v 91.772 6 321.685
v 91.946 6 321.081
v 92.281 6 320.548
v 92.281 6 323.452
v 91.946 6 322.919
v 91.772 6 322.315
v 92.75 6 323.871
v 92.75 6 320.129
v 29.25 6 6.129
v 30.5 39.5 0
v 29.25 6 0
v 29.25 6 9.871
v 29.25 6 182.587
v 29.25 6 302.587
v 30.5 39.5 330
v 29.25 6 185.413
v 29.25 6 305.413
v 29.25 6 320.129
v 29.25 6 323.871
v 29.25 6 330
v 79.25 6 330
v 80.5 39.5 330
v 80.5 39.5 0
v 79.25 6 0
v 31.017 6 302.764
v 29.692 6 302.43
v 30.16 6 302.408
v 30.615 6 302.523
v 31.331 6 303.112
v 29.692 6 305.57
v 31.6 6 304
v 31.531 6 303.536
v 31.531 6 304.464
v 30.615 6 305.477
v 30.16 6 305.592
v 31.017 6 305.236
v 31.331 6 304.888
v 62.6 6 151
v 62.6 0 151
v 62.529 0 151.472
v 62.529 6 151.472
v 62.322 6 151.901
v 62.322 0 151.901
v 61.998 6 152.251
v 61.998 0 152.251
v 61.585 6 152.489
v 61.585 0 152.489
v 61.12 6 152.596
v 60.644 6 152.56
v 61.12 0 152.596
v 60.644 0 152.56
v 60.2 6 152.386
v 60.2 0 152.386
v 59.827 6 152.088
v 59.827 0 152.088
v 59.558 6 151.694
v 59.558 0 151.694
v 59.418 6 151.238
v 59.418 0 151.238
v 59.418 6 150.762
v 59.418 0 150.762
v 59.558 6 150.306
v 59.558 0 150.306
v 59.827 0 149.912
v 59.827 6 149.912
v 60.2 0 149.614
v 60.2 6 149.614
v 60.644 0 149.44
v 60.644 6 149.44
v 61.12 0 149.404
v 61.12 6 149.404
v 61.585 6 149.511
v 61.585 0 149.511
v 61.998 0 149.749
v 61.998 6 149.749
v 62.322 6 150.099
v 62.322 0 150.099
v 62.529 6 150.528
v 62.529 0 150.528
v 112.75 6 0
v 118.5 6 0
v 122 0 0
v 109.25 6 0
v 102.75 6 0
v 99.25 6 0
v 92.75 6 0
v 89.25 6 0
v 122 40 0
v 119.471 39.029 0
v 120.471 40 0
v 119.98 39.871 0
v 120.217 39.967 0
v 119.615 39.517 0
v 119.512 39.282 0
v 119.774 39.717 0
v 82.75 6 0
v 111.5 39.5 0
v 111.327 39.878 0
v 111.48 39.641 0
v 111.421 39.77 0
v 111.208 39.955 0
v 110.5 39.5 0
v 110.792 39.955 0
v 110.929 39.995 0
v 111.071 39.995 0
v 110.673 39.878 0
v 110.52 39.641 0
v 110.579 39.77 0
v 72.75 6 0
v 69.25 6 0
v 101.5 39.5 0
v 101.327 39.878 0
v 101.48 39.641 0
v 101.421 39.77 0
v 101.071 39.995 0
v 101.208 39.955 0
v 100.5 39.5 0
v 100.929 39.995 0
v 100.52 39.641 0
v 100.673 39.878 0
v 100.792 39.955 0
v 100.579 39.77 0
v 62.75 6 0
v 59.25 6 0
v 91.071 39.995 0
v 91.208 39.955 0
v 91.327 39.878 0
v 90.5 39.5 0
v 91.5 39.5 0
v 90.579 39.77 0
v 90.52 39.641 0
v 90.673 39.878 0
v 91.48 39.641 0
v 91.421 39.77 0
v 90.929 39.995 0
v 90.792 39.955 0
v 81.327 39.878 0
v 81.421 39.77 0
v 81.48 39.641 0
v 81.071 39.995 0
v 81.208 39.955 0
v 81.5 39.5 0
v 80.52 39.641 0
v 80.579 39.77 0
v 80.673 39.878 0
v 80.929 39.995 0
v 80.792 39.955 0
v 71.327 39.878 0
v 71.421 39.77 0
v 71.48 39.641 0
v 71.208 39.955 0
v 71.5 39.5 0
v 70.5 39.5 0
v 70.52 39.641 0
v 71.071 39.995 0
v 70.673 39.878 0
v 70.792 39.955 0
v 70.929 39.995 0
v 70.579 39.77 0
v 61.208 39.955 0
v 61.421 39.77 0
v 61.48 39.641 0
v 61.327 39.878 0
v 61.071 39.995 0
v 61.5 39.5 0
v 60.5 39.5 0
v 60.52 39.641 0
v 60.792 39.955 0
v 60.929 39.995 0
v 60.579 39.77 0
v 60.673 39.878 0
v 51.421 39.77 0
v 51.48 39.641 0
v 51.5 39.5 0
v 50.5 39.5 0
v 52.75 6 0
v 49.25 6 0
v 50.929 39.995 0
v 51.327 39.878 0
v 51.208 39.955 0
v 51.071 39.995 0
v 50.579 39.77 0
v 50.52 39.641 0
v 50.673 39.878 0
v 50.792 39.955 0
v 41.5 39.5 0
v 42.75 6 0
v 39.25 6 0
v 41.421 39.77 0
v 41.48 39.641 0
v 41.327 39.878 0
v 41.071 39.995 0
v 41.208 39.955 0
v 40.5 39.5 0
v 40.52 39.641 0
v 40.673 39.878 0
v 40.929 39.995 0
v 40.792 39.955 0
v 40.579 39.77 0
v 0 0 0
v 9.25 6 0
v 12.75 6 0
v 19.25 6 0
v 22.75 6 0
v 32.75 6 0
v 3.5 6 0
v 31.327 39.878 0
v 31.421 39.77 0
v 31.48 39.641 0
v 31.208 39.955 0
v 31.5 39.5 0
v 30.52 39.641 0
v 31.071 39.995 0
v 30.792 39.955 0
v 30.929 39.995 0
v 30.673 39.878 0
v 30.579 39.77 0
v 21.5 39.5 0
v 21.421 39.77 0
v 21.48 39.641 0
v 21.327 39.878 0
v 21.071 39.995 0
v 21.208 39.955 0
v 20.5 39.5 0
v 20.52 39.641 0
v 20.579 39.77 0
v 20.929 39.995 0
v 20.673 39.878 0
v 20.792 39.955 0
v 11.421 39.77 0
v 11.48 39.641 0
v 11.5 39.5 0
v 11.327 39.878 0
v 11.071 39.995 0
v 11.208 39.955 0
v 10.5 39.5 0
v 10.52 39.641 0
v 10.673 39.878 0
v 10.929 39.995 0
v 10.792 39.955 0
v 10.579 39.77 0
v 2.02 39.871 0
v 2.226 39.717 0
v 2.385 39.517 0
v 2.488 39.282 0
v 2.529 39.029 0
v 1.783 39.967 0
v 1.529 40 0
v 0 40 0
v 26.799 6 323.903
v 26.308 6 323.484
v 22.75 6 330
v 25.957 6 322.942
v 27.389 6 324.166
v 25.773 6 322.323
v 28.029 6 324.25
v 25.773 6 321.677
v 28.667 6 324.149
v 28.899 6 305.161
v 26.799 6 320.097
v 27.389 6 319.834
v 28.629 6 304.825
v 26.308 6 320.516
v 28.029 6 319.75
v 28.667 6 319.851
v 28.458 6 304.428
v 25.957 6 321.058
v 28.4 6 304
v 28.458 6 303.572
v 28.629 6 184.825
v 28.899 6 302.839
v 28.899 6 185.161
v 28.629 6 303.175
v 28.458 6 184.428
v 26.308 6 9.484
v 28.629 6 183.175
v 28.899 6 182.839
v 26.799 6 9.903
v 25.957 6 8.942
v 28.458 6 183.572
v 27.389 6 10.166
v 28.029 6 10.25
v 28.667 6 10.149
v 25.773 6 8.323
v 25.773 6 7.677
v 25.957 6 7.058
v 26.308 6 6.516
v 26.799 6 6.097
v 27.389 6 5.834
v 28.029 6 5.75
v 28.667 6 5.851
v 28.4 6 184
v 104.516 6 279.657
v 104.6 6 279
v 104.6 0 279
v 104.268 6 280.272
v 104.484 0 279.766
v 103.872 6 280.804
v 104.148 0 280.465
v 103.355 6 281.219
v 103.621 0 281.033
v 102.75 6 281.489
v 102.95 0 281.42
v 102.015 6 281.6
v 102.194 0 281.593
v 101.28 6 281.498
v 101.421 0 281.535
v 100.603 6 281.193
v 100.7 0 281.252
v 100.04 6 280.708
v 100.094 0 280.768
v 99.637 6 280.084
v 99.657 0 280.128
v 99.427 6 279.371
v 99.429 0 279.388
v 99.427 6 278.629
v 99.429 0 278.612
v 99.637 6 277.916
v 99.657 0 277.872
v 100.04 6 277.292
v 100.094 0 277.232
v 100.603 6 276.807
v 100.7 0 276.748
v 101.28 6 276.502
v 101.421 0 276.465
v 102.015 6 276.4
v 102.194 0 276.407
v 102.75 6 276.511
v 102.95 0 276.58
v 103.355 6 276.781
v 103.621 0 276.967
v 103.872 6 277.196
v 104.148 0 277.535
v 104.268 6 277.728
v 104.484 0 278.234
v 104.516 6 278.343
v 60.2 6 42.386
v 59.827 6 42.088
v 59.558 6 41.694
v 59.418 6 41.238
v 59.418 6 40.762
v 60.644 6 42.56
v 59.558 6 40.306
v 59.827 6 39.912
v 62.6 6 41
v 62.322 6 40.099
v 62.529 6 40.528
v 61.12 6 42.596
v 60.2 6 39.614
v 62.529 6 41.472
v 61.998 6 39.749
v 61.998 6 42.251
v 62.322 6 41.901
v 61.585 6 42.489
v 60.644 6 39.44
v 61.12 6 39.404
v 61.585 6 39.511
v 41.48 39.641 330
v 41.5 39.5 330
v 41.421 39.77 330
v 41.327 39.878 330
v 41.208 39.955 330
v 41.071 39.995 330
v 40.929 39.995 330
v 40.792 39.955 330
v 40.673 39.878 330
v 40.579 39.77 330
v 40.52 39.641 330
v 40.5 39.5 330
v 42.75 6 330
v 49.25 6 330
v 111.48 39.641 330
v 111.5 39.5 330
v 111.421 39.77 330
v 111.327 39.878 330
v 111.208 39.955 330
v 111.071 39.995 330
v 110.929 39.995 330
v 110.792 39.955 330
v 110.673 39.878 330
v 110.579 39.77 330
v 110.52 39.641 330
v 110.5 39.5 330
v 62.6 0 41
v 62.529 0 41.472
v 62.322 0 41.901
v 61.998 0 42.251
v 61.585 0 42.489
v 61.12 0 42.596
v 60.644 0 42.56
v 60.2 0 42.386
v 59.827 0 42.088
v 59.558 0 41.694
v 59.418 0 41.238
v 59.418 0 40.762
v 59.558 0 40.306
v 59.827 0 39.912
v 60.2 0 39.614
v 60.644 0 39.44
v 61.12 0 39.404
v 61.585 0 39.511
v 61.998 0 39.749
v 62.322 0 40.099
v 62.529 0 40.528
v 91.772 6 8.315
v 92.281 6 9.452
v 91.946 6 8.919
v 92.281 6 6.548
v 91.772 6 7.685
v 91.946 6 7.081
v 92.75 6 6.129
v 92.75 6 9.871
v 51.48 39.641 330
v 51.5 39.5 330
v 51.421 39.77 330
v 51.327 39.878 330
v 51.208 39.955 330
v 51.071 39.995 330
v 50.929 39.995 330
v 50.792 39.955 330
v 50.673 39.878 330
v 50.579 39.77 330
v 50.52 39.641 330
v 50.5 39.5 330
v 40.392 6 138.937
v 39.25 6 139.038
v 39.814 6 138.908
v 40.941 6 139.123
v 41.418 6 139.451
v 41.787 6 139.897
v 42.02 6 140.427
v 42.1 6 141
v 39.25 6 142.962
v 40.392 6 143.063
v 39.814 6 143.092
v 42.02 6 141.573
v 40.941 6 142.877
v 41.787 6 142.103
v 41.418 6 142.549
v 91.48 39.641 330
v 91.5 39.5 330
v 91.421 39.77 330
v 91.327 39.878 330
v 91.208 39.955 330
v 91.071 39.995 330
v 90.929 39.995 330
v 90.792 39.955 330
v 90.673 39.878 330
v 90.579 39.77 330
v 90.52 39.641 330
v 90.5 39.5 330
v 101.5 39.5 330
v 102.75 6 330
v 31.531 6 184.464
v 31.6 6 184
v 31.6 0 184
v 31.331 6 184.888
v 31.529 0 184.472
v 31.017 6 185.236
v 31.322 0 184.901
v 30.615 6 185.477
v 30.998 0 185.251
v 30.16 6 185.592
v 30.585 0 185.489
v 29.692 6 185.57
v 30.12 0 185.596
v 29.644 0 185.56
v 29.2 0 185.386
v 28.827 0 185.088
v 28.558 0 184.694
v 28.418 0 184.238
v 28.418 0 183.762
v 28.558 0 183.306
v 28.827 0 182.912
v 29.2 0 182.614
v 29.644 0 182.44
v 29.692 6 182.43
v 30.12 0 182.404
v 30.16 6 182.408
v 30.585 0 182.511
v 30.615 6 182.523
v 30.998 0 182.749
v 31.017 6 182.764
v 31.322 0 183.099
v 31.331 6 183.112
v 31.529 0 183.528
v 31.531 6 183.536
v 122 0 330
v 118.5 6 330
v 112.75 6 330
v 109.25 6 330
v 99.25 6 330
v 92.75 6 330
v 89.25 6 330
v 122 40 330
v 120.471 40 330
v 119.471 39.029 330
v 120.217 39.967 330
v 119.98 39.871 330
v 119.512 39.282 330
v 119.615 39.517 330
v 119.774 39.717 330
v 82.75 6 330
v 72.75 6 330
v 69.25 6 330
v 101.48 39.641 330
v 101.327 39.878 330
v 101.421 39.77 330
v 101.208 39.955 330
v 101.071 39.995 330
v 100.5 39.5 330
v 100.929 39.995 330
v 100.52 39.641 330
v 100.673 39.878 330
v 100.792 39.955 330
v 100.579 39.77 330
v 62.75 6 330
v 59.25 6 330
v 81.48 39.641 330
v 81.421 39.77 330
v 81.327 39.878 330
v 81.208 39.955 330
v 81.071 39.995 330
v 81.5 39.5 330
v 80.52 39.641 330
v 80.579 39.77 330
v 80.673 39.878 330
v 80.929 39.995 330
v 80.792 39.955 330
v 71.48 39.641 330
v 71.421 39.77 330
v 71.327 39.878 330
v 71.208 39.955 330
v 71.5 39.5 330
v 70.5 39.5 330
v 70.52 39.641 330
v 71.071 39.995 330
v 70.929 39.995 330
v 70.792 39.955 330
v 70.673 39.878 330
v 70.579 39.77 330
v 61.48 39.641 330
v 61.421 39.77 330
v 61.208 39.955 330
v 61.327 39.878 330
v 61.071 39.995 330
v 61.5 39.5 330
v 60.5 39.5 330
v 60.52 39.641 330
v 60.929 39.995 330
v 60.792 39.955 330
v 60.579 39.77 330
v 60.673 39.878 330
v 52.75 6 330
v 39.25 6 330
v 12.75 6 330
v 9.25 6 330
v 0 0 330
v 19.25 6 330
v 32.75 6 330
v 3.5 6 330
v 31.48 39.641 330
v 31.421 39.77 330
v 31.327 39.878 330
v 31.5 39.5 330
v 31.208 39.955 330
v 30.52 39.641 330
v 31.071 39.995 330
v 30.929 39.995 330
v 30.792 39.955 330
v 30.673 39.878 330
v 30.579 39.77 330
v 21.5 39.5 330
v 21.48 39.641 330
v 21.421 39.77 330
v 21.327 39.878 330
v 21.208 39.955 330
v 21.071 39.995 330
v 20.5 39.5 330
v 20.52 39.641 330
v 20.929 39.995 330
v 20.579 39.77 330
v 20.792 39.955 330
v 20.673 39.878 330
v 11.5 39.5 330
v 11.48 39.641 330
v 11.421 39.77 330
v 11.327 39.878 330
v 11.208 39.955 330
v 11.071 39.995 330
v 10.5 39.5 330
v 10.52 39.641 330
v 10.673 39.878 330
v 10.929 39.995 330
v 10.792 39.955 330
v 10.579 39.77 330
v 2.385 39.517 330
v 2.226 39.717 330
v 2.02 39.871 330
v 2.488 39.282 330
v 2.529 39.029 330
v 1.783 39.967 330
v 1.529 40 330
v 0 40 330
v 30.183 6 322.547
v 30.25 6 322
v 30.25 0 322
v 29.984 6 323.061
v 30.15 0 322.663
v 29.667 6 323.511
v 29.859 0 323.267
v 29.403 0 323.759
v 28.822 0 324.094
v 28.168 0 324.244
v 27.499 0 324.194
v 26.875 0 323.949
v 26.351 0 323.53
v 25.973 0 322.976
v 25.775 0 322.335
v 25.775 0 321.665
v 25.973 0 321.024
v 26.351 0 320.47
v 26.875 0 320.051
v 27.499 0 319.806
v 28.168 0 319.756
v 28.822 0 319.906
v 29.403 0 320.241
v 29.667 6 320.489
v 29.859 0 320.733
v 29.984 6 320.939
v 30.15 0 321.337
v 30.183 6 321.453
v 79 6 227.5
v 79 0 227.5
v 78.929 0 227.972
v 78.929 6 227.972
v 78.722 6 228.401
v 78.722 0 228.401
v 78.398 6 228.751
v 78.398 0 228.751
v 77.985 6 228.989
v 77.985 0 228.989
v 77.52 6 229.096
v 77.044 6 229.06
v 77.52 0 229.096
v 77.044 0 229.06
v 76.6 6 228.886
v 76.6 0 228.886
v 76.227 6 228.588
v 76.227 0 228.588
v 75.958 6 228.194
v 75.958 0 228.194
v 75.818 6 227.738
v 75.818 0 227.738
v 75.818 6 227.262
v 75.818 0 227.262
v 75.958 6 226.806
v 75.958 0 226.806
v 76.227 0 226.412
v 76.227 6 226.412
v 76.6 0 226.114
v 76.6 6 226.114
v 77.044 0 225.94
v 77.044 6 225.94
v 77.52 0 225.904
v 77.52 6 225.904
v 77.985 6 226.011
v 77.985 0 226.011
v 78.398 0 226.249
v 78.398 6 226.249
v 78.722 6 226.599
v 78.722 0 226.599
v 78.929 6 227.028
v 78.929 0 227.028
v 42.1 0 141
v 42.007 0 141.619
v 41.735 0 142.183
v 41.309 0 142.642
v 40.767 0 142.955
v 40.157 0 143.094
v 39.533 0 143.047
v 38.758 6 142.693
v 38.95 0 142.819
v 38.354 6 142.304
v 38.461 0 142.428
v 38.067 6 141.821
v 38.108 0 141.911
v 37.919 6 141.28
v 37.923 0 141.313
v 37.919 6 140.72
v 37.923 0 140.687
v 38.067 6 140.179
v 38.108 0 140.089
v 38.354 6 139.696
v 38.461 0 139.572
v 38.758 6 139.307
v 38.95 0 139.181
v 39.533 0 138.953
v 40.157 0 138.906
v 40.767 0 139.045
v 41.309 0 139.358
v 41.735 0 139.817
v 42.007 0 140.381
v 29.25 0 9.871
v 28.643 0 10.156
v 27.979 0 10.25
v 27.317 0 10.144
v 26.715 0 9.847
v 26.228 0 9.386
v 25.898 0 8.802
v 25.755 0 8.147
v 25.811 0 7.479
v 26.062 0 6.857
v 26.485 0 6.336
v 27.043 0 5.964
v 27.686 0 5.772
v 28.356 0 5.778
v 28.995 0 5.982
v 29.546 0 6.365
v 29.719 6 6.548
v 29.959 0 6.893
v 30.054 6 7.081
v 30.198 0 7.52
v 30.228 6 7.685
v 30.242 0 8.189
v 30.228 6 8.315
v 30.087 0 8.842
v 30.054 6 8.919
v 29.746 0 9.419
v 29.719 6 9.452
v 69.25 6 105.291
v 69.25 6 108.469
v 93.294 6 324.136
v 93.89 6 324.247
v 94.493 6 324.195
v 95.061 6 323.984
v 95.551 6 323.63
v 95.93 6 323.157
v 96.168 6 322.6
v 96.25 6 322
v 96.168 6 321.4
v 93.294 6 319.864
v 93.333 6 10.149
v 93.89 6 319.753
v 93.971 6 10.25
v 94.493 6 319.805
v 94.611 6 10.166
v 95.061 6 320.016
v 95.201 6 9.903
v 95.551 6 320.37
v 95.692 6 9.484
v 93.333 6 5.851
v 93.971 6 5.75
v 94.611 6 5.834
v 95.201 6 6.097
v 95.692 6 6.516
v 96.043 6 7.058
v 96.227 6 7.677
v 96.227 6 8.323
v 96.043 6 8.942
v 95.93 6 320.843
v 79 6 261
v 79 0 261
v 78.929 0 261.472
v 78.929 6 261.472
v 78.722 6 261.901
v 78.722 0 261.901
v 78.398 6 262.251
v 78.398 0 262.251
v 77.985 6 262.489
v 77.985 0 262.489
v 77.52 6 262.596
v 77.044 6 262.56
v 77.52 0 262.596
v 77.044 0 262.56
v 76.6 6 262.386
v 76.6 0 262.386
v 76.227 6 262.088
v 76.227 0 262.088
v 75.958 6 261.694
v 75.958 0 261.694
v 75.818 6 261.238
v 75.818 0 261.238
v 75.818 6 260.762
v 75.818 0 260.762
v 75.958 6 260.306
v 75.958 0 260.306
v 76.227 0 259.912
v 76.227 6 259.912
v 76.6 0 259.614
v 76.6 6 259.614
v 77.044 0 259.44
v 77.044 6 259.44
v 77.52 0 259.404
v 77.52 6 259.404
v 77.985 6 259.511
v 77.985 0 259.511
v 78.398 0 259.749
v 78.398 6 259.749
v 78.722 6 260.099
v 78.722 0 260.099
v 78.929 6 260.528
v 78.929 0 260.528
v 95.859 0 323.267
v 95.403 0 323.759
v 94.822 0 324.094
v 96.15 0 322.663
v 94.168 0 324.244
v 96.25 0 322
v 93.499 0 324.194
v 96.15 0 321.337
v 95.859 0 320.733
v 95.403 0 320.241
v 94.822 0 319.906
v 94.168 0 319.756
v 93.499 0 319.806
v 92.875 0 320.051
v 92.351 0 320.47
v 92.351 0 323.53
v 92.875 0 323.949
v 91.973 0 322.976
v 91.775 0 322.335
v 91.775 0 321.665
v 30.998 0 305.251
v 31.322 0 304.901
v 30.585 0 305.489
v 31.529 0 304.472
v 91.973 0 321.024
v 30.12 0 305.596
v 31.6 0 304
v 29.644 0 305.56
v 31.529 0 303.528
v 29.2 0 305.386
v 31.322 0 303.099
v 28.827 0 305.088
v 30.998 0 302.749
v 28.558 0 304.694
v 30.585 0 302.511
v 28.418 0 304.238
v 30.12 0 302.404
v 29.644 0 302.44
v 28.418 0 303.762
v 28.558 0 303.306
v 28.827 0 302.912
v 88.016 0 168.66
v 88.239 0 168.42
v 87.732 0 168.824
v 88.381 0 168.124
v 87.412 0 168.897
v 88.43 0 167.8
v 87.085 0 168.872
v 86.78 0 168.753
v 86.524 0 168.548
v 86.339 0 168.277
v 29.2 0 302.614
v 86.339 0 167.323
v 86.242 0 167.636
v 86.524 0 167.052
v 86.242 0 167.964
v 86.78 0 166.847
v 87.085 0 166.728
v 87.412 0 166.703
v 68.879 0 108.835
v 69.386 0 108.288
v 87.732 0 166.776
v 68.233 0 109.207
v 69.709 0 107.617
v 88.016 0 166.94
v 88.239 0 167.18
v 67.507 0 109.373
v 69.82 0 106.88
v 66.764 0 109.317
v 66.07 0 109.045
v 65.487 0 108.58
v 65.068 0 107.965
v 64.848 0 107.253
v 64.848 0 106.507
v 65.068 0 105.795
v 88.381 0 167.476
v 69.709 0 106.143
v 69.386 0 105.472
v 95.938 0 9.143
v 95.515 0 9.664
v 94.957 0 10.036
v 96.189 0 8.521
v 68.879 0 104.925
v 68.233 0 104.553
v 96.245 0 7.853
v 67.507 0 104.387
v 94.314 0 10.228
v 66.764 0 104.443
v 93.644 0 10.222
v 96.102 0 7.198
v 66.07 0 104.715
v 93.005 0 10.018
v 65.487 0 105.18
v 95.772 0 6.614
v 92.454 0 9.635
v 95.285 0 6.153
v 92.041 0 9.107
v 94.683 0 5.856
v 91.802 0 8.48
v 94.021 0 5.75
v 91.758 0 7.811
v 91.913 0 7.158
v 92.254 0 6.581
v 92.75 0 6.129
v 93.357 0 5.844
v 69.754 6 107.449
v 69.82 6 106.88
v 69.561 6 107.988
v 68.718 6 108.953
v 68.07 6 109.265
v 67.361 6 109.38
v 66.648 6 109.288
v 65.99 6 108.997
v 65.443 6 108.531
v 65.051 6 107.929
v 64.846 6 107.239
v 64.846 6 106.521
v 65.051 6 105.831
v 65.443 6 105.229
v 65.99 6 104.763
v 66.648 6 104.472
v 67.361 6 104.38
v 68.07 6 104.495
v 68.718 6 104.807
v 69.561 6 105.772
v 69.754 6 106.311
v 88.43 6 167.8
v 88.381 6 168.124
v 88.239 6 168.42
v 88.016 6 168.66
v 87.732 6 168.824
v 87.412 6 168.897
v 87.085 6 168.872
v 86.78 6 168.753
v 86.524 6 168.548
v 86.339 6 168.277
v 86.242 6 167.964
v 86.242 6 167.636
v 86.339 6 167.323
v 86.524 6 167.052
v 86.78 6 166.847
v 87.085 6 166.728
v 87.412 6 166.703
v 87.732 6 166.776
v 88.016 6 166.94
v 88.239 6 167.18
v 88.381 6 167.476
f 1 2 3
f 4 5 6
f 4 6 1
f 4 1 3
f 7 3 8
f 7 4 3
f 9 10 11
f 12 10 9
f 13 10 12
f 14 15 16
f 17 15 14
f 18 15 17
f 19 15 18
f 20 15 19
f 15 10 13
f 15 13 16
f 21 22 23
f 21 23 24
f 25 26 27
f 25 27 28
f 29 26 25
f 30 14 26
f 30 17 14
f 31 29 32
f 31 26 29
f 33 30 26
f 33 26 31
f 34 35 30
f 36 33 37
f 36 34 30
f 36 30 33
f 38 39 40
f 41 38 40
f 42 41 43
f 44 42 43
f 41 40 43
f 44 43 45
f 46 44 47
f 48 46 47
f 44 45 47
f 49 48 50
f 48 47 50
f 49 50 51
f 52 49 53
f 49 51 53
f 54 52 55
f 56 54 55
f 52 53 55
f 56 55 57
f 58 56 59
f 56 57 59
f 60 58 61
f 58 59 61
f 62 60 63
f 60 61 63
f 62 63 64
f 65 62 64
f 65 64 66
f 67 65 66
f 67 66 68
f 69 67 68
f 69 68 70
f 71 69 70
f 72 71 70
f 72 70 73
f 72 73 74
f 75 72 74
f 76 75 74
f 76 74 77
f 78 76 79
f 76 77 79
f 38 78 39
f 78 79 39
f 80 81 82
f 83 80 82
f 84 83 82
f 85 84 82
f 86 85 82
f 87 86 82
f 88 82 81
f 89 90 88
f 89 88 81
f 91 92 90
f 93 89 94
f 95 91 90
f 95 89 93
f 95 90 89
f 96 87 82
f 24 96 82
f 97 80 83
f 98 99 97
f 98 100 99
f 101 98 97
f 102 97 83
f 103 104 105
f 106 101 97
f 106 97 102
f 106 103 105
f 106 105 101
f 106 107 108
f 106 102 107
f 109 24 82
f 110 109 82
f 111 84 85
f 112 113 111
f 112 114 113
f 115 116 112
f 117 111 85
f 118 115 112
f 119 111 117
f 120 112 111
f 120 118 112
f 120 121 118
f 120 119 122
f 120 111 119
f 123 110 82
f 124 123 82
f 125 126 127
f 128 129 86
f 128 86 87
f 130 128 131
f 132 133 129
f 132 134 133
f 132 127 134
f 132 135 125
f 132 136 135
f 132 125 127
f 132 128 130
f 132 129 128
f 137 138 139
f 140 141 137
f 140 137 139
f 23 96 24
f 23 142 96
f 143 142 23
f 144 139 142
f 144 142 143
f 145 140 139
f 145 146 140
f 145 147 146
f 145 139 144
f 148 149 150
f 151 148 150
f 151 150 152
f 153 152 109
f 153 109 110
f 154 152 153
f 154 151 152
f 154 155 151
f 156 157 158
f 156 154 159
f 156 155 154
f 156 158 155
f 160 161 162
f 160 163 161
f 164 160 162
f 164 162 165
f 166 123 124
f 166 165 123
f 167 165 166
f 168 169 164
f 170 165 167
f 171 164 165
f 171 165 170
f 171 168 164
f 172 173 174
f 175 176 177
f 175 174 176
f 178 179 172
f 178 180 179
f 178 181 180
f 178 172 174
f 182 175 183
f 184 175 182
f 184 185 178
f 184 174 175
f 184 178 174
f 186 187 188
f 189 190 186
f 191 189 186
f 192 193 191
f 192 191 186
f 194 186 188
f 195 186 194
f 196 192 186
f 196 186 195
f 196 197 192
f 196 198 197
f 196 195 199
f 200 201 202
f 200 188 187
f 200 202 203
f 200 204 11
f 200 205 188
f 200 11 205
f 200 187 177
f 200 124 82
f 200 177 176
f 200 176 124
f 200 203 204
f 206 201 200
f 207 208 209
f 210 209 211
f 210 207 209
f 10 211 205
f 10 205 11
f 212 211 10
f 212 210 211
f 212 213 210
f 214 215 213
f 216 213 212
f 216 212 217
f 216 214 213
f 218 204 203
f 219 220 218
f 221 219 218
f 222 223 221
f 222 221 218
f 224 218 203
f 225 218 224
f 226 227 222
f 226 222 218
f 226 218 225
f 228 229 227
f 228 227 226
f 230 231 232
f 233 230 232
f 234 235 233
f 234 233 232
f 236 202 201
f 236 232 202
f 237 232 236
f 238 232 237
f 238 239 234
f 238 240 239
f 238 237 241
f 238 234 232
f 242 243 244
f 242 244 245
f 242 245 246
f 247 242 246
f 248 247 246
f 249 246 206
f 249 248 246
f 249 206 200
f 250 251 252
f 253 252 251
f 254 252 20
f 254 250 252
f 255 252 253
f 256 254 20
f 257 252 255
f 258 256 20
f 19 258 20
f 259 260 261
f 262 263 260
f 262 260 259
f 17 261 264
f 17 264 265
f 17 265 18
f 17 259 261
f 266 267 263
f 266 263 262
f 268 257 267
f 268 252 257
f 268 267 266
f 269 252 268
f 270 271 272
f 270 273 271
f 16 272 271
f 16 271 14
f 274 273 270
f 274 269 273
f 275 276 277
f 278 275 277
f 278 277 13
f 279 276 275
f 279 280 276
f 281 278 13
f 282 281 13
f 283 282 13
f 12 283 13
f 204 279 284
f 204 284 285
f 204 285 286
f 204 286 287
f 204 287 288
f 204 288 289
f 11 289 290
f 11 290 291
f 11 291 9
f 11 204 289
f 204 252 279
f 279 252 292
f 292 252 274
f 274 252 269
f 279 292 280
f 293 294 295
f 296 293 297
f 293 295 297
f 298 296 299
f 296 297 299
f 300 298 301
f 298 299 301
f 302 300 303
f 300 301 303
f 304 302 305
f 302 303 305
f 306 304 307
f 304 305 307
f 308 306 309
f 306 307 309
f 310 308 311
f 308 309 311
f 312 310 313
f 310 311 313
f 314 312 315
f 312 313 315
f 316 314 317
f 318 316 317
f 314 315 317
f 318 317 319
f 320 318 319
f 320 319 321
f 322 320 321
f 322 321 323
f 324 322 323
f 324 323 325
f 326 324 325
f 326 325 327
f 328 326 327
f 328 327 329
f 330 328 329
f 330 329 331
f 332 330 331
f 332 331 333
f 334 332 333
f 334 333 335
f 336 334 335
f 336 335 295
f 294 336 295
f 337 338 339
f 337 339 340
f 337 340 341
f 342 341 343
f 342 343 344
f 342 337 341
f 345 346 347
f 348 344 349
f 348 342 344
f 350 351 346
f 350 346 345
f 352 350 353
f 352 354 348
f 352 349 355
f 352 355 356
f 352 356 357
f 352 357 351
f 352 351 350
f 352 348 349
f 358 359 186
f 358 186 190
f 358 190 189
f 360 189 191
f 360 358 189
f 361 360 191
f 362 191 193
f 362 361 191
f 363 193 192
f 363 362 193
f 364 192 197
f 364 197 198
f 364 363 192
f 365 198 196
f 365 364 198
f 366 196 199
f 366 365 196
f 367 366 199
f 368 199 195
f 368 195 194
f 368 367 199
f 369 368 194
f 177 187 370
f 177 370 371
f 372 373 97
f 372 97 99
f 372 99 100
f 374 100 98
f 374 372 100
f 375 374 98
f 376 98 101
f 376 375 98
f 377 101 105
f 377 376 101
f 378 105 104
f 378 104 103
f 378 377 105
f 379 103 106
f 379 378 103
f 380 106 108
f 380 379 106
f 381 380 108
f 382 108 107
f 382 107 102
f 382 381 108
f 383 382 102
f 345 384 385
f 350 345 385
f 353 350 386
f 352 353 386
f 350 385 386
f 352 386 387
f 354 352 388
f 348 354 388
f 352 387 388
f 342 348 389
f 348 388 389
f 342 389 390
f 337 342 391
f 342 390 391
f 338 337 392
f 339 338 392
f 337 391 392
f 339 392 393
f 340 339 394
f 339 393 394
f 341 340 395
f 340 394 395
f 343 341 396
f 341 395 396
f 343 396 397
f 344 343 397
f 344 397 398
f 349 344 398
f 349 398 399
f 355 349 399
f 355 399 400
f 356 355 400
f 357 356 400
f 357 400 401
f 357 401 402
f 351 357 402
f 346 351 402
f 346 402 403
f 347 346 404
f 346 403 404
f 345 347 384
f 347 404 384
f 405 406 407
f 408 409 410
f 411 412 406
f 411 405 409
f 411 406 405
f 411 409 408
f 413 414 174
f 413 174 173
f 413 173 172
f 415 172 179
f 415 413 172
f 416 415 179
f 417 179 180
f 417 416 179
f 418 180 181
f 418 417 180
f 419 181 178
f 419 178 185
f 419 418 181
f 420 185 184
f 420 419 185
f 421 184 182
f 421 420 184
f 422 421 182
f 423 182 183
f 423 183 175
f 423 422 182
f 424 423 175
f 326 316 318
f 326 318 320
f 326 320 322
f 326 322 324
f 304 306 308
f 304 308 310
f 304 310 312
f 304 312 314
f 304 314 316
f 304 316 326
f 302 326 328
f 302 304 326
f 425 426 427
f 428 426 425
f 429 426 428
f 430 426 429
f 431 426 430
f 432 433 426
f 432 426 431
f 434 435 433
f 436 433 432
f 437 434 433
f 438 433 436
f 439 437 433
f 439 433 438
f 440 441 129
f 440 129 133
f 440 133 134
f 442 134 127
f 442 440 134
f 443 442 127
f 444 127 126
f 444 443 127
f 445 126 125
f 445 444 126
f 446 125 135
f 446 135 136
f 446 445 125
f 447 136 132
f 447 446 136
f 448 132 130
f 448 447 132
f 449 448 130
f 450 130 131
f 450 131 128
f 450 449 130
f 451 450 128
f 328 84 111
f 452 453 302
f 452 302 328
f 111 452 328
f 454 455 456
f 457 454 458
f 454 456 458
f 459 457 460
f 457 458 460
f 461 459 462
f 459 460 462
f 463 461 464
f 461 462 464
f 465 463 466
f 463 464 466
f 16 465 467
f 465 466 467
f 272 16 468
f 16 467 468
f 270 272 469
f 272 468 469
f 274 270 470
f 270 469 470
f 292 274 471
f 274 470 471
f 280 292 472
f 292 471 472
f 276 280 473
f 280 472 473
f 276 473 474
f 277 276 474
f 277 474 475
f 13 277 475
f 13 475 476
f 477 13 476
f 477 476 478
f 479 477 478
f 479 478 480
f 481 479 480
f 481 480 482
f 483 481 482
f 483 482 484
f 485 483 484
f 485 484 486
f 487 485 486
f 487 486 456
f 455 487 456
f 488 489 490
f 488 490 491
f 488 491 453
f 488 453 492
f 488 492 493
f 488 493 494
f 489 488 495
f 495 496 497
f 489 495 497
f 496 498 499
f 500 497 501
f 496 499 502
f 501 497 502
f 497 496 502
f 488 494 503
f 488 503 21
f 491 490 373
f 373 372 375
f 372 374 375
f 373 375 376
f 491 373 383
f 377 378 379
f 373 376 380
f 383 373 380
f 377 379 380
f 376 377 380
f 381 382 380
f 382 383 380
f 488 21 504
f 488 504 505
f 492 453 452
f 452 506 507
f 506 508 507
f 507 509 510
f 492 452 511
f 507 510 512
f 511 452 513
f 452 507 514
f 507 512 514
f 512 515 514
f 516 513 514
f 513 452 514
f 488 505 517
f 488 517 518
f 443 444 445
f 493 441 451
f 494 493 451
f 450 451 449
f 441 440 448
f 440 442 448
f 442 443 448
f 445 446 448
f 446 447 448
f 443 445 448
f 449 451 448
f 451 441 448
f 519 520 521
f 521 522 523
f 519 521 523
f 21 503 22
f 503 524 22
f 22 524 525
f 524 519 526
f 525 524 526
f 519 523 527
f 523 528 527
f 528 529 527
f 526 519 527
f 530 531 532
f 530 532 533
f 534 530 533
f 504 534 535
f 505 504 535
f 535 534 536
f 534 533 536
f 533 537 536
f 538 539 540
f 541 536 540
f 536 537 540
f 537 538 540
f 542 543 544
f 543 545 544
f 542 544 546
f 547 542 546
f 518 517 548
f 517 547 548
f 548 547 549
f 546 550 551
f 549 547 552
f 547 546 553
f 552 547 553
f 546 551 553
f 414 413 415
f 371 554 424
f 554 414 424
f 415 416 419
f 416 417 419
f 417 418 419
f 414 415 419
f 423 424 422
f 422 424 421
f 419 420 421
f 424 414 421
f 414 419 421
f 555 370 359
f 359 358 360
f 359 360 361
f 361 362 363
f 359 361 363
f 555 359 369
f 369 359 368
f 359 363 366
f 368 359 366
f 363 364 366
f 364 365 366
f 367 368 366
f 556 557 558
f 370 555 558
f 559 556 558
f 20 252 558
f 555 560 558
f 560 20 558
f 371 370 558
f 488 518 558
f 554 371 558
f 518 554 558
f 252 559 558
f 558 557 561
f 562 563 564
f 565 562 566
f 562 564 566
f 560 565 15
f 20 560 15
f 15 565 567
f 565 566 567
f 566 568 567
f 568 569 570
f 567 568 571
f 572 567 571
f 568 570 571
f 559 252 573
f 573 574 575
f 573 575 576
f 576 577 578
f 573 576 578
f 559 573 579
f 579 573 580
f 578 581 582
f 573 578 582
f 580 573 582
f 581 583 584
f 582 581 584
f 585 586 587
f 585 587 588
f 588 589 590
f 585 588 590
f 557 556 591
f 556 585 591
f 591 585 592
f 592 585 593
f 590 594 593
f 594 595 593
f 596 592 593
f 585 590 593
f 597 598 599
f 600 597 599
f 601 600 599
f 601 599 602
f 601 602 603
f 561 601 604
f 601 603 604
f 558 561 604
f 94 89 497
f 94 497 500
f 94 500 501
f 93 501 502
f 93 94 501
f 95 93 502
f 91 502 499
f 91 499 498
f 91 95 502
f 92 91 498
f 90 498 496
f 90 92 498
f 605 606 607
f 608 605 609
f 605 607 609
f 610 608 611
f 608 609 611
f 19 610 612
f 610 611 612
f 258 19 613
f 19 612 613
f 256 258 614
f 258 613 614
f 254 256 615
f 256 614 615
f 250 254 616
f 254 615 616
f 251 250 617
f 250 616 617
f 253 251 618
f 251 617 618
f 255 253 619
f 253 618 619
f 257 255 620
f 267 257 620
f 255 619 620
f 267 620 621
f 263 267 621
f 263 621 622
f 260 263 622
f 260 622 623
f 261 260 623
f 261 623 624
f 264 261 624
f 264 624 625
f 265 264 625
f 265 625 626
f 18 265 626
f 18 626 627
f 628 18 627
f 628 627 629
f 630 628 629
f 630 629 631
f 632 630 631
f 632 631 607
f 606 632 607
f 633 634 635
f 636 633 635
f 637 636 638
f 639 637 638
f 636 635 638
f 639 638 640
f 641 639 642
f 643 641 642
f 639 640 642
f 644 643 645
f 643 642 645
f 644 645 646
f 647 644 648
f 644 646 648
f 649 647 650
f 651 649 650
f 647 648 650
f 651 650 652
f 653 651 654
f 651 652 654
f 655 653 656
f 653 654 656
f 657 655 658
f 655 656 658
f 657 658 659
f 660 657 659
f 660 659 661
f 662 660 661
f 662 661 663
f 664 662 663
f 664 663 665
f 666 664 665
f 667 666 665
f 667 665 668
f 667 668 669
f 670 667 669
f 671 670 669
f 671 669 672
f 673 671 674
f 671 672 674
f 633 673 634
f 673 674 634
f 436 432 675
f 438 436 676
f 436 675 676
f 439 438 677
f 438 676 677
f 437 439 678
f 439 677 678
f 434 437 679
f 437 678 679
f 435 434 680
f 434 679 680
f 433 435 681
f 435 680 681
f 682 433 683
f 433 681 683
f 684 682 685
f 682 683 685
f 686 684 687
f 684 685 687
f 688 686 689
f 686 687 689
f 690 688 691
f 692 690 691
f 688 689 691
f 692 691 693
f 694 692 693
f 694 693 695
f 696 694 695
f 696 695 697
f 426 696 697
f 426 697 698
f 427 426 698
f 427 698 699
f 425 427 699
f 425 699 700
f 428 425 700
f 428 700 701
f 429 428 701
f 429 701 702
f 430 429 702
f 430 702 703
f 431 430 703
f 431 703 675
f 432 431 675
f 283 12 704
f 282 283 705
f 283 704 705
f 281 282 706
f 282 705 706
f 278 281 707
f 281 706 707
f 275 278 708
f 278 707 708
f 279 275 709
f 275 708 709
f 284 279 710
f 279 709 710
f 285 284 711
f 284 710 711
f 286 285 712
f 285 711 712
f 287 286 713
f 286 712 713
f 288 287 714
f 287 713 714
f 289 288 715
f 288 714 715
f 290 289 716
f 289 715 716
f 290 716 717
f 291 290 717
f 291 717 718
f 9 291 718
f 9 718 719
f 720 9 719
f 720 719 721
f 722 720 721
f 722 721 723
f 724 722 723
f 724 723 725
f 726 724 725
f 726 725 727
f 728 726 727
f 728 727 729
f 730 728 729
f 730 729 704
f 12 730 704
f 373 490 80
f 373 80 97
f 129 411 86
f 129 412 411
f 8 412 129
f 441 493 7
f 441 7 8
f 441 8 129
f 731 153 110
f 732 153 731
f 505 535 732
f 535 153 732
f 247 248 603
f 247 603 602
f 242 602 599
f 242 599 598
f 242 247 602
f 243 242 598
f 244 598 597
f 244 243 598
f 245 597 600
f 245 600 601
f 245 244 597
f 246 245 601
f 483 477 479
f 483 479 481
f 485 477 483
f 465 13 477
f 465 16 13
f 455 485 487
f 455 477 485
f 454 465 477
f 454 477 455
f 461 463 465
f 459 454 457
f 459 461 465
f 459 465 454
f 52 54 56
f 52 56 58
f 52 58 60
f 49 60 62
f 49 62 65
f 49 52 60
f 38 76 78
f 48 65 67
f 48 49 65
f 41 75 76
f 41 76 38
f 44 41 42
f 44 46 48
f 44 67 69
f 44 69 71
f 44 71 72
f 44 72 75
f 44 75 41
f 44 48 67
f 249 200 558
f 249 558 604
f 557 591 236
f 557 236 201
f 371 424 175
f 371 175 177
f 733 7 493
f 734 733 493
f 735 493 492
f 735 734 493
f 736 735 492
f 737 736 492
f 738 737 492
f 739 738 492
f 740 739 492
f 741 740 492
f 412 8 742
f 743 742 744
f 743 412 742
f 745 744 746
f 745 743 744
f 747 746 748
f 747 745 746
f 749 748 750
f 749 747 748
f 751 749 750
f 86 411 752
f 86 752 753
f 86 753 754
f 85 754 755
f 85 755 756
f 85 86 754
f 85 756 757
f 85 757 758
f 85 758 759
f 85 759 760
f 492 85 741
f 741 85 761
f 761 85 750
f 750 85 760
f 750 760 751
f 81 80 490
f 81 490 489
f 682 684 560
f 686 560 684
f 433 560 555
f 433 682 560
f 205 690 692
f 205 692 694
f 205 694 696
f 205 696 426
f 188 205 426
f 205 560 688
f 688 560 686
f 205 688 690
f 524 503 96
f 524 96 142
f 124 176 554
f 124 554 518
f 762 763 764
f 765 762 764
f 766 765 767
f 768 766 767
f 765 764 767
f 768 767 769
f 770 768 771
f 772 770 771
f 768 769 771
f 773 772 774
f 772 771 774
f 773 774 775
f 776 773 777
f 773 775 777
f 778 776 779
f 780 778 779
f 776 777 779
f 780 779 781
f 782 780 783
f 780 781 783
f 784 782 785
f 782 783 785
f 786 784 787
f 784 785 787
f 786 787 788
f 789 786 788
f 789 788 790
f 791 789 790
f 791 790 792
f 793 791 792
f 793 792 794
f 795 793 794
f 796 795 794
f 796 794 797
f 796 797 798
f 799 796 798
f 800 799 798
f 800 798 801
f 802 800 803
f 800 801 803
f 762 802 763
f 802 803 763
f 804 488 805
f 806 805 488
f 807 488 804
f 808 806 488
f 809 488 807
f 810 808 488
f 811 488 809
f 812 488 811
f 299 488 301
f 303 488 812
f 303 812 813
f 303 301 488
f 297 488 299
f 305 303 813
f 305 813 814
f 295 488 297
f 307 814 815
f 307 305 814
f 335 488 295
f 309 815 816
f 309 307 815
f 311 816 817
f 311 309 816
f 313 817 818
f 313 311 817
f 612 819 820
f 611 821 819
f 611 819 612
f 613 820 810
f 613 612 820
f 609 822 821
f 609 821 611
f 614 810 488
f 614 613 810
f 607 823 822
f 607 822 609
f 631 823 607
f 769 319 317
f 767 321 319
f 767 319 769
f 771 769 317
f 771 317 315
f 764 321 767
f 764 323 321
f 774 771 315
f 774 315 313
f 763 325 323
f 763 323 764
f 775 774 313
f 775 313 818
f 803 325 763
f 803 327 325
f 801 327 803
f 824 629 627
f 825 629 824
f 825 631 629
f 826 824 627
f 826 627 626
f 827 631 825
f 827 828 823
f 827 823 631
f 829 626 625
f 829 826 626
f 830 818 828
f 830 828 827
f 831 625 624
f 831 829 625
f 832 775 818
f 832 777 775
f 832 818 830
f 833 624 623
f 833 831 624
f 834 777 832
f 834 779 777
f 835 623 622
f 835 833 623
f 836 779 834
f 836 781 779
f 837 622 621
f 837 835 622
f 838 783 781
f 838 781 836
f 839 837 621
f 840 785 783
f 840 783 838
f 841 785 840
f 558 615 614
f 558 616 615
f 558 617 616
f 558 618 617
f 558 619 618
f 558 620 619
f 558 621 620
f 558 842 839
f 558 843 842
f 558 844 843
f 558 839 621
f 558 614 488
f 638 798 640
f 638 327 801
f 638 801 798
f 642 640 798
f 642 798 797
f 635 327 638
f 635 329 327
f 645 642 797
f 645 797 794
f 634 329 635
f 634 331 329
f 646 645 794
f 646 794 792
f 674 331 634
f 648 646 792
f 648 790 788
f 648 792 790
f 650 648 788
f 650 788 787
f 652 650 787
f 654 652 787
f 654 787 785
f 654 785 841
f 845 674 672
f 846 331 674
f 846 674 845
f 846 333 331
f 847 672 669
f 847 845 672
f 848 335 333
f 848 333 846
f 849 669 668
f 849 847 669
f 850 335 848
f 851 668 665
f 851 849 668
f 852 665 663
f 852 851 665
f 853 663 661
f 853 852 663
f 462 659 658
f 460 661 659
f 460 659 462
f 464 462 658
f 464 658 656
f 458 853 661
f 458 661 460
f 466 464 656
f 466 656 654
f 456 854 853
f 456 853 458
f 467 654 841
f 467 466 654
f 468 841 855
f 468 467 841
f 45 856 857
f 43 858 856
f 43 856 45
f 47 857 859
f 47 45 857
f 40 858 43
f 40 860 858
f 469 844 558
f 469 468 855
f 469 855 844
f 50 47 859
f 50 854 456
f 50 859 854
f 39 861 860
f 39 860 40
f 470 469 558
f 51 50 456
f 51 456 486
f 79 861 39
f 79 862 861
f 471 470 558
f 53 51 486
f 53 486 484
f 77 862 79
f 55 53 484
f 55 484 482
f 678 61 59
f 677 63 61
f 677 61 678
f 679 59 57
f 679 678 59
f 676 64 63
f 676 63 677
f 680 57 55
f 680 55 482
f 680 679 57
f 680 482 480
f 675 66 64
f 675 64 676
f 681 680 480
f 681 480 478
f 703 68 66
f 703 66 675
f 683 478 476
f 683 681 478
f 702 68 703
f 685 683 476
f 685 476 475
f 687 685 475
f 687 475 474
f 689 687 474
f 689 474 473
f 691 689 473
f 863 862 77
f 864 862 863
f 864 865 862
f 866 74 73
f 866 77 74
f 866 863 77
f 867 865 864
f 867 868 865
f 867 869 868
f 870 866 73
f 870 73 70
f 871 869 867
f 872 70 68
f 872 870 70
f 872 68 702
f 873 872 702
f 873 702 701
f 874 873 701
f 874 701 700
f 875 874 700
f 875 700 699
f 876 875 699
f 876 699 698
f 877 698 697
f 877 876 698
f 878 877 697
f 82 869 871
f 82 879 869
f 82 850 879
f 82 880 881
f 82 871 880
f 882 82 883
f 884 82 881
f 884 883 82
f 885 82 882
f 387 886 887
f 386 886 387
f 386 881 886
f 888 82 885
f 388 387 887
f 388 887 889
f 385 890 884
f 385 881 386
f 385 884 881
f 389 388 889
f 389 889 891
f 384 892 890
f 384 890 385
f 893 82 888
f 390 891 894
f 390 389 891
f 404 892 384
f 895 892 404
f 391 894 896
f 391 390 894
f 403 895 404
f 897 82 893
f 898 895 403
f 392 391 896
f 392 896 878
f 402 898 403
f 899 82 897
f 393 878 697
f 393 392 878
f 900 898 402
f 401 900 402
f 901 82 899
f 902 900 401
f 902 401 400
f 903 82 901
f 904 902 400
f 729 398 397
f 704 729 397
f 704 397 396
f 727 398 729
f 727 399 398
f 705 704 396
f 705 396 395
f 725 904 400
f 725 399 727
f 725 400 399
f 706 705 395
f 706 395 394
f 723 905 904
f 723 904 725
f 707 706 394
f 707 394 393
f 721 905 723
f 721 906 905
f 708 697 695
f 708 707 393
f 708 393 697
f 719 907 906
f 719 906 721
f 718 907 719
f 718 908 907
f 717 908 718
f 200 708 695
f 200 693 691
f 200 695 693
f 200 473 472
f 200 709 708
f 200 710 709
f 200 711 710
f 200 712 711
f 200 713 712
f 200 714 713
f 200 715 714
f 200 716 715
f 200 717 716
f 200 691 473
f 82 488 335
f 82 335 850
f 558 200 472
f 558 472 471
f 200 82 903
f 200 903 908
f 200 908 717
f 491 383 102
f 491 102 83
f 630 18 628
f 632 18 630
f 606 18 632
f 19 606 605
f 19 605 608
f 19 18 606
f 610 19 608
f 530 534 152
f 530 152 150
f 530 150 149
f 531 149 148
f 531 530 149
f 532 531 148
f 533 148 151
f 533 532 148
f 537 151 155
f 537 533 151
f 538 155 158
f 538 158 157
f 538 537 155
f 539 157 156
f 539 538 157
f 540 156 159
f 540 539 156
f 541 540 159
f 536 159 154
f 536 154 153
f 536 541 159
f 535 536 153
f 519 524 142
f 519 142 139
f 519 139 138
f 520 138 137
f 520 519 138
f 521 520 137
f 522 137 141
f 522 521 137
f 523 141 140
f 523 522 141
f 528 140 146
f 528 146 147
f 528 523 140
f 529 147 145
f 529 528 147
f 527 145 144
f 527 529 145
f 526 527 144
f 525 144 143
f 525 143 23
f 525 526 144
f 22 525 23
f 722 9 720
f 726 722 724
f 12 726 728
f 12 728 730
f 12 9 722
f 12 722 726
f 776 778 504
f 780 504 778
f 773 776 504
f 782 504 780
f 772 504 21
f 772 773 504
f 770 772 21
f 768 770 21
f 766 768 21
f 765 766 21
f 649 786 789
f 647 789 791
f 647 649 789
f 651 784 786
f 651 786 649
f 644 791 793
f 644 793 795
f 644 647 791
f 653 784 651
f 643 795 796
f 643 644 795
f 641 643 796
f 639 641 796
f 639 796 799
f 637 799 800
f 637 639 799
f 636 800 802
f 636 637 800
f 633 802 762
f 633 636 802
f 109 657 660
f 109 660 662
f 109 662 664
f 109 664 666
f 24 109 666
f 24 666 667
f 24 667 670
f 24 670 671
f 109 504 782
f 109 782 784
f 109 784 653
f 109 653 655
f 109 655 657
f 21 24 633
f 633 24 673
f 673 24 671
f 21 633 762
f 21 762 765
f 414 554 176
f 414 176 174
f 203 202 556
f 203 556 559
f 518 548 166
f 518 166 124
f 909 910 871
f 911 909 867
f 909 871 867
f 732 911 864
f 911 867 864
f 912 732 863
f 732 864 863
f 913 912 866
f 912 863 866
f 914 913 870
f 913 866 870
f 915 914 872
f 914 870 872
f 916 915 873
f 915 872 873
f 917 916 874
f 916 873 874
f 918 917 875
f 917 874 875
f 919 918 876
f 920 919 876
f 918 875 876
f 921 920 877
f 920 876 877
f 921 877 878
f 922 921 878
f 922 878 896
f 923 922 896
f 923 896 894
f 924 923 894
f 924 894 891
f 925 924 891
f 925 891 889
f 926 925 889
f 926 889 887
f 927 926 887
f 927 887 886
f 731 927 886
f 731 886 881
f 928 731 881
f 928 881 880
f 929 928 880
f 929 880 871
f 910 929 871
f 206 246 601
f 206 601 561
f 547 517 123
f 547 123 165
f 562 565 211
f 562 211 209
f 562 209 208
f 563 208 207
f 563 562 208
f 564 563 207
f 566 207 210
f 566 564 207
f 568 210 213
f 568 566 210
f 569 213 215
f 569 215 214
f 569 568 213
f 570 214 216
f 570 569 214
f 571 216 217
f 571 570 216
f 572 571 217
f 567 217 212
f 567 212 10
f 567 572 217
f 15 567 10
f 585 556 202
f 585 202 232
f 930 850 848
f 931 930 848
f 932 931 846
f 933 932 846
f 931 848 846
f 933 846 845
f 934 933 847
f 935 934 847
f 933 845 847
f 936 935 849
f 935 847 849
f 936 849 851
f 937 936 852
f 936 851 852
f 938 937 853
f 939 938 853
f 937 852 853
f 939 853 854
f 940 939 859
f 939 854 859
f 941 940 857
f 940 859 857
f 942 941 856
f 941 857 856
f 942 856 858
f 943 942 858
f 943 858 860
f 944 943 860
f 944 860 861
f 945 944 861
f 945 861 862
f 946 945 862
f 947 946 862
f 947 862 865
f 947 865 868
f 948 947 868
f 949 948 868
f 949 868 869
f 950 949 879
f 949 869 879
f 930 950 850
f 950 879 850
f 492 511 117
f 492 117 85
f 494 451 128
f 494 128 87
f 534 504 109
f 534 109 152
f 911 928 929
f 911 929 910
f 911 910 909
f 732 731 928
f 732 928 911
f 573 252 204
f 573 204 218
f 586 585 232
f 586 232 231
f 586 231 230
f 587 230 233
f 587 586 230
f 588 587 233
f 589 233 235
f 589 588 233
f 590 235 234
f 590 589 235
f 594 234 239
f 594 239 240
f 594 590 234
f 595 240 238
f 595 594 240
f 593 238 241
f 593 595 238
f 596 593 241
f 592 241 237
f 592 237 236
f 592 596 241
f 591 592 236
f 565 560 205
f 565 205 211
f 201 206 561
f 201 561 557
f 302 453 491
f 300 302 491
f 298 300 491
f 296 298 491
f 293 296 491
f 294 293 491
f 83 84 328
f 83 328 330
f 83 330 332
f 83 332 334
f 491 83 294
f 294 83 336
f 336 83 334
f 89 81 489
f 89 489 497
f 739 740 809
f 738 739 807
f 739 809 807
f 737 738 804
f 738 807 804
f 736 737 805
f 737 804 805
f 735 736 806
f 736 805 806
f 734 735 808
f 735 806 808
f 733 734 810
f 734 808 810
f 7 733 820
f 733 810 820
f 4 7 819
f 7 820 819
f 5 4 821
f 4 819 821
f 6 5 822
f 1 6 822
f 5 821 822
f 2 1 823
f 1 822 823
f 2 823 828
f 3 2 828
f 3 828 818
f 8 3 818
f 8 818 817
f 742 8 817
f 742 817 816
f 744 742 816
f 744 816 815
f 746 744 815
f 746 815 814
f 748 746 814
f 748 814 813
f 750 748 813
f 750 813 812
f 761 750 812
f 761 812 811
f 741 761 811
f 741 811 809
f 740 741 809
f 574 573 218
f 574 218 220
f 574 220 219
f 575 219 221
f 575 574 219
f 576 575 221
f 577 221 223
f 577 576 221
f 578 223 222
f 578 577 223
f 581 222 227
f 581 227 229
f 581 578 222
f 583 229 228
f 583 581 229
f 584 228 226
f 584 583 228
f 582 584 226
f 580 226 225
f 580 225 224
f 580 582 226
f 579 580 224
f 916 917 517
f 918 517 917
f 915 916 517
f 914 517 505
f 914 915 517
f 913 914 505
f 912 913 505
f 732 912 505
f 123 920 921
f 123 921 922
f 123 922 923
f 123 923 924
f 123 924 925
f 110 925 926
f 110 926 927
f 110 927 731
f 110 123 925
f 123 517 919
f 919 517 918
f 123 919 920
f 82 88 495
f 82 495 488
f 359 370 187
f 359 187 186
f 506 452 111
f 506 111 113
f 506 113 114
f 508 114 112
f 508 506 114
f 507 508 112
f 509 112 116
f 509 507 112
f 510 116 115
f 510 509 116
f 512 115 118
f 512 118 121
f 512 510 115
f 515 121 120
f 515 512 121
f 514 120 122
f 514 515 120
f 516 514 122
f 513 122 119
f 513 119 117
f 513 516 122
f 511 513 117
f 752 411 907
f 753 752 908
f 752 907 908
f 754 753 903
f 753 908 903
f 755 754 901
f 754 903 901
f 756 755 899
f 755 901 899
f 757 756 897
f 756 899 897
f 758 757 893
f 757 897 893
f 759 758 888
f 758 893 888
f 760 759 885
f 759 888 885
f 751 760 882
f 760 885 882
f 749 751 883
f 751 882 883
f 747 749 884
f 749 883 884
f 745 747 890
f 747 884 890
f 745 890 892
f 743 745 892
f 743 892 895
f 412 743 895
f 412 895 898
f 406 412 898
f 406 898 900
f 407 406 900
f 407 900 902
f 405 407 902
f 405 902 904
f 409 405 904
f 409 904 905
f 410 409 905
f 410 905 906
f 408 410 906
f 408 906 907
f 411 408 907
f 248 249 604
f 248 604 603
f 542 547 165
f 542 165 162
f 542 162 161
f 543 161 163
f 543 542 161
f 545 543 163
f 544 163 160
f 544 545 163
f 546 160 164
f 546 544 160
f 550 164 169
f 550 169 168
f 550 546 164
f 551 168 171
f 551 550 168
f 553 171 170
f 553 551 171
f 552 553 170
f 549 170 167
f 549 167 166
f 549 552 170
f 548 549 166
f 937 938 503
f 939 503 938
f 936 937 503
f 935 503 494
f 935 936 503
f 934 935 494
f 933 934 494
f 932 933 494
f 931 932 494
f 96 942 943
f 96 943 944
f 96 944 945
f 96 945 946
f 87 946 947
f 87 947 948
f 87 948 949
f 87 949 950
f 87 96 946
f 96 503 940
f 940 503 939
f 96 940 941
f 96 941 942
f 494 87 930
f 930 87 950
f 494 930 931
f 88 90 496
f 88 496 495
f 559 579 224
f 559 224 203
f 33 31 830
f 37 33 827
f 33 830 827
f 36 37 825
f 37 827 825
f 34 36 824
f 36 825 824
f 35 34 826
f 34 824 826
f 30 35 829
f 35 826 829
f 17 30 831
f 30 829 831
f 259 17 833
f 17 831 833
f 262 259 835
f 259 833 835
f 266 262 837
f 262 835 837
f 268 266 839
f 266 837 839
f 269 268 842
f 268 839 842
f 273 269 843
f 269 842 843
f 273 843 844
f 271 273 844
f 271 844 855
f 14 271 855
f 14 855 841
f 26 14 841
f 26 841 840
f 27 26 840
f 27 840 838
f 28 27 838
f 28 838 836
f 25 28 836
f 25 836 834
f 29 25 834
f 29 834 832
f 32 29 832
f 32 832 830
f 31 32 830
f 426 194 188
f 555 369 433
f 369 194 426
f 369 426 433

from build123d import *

# Parameters (mm, degrees)
EXTRUDE_1_DEPTH       = 330
EXTRUDE_3_DEPTH       = 330
PATTERN_CURVE_1_COUNT = 11
PATTERN_CURVE_1_PITCH = 10
SKETCH_3_R            = 2.25
CUT_EXTRUDE_1_DEPTH   = 6
SKETCH_4_R            = 1.6
SKETCH_4_R_2          = 2.1
SKETCH_4_R_3          = 2.5
SKETCH_4_R_4          = 2.6
SKETCH_4_R_5          = 1.1
CUT_EXTRUDE_2_DEPTH   = 6


with BuildPart() as part:
    # Эскиз1 → Вытянуть1 (new body)
    with BuildSketch(Plane.XY):
        with BuildLine():
            Line((0, 40), (1.528979332, 40))
            ThreePointArc((1.528979332, 40), (2.225614441, 39.717425624), (2.528547087, 39.029399052))
            Line((2.528547087, 39.029399052), (3.5, 6))
            Line((3.5, 6), (118.5, 6))
            Line((118.5, 6), (119.471452913, 39.029399052))
            ThreePointArc((119.471452913, 39.029399052), (119.774385559, 39.717425624), (120.471020668, 40))
            Line((120.471020668, 40), (122, 40))
            Line((122, 40), (122, 0))
            Line((122, 0), (0, 0))
            Line((0, 0), (0, 40))
        make_face()
    extrude(amount=EXTRUDE_1_DEPTH)

    # Эскиз2 → Вытянуть3 (add)
    with BuildSketch(Plane.XY.offset(330)):
        with BuildLine():
            Line((10.5, 39.5), (9.25, 6))
            Line((9.25, 6), (12.75, 6))
            Line((12.75, 6), (11.5, 39.5))
            ThreePointArc((11.5, 39.5), (11, 40), (10.5, 39.5))
        make_face()
    extrude_3 = extrude(amount=-EXTRUDE_3_DEPTH)

    # Кривая1: Вытянуть3 ×11
    with Locations(*[(i * PATTERN_CURVE_1_PITCH, 0, 0) for i in range(1, PATTERN_CURVE_1_COUNT)]):
        add(extrude_3)

    # Эскиз3 → Вырез-Вытянуть1 (cut)
    with BuildSketch(Plane.XZ):
        with Locations((28, 322)):
            Circle(SKETCH_3_R)
        with Locations((94, 322)):
            Circle(SKETCH_3_R)
        with Locations(Location((94, 8, 0), (0, 0, 236.251011404))):
            Circle(SKETCH_3_R)
        with Locations(Location((28, 8, 0), (0, 0, 56.251011404))):
            Circle(SKETCH_3_R)
    extrude(amount=-CUT_EXTRUDE_1_DEPTH, mode=Mode.SUBTRACT)

    # Эскиз4 → Вырез-Вытянуть2 (cut)
    with BuildSketch(Plane(origin=(1.487985642, 0, 27.400529356), x_dir=(1, 0, 0), z_dir=(0, -1, 0))):
        with Locations((75.912014358, 233.599470644)):
            Circle(SKETCH_4_R)
        with Locations((59.512014358, 123.599470644)):
            Circle(SKETCH_4_R)
        with Locations((75.912014358, 200.099470644)):
            Circle(SKETCH_4_R)
        with Locations((28.512014358, 276.599470644)):
            Circle(SKETCH_4_R)
        with Locations((28.512014358, 156.599470644)):
            Circle(SKETCH_4_R)
        with Locations((59.512014358, 13.599470644)):
            Circle(SKETCH_4_R)
        with Locations((38.512014358, 113.599470644)):
            Circle(SKETCH_4_R_2)
        with Locations((65.832014358, 79.479470644)):
            Circle(SKETCH_4_R_3)
        with Locations((100.512014358, 251.599470644)):
            Circle(SKETCH_4_R_4)
        with Locations((85.842014358, 140.399470644)):
            Circle(SKETCH_4_R_5)
    extrude(amount=-CUT_EXTRUDE_2_DEPTH, mode=Mode.SUBTRACT)


solid = part.part
